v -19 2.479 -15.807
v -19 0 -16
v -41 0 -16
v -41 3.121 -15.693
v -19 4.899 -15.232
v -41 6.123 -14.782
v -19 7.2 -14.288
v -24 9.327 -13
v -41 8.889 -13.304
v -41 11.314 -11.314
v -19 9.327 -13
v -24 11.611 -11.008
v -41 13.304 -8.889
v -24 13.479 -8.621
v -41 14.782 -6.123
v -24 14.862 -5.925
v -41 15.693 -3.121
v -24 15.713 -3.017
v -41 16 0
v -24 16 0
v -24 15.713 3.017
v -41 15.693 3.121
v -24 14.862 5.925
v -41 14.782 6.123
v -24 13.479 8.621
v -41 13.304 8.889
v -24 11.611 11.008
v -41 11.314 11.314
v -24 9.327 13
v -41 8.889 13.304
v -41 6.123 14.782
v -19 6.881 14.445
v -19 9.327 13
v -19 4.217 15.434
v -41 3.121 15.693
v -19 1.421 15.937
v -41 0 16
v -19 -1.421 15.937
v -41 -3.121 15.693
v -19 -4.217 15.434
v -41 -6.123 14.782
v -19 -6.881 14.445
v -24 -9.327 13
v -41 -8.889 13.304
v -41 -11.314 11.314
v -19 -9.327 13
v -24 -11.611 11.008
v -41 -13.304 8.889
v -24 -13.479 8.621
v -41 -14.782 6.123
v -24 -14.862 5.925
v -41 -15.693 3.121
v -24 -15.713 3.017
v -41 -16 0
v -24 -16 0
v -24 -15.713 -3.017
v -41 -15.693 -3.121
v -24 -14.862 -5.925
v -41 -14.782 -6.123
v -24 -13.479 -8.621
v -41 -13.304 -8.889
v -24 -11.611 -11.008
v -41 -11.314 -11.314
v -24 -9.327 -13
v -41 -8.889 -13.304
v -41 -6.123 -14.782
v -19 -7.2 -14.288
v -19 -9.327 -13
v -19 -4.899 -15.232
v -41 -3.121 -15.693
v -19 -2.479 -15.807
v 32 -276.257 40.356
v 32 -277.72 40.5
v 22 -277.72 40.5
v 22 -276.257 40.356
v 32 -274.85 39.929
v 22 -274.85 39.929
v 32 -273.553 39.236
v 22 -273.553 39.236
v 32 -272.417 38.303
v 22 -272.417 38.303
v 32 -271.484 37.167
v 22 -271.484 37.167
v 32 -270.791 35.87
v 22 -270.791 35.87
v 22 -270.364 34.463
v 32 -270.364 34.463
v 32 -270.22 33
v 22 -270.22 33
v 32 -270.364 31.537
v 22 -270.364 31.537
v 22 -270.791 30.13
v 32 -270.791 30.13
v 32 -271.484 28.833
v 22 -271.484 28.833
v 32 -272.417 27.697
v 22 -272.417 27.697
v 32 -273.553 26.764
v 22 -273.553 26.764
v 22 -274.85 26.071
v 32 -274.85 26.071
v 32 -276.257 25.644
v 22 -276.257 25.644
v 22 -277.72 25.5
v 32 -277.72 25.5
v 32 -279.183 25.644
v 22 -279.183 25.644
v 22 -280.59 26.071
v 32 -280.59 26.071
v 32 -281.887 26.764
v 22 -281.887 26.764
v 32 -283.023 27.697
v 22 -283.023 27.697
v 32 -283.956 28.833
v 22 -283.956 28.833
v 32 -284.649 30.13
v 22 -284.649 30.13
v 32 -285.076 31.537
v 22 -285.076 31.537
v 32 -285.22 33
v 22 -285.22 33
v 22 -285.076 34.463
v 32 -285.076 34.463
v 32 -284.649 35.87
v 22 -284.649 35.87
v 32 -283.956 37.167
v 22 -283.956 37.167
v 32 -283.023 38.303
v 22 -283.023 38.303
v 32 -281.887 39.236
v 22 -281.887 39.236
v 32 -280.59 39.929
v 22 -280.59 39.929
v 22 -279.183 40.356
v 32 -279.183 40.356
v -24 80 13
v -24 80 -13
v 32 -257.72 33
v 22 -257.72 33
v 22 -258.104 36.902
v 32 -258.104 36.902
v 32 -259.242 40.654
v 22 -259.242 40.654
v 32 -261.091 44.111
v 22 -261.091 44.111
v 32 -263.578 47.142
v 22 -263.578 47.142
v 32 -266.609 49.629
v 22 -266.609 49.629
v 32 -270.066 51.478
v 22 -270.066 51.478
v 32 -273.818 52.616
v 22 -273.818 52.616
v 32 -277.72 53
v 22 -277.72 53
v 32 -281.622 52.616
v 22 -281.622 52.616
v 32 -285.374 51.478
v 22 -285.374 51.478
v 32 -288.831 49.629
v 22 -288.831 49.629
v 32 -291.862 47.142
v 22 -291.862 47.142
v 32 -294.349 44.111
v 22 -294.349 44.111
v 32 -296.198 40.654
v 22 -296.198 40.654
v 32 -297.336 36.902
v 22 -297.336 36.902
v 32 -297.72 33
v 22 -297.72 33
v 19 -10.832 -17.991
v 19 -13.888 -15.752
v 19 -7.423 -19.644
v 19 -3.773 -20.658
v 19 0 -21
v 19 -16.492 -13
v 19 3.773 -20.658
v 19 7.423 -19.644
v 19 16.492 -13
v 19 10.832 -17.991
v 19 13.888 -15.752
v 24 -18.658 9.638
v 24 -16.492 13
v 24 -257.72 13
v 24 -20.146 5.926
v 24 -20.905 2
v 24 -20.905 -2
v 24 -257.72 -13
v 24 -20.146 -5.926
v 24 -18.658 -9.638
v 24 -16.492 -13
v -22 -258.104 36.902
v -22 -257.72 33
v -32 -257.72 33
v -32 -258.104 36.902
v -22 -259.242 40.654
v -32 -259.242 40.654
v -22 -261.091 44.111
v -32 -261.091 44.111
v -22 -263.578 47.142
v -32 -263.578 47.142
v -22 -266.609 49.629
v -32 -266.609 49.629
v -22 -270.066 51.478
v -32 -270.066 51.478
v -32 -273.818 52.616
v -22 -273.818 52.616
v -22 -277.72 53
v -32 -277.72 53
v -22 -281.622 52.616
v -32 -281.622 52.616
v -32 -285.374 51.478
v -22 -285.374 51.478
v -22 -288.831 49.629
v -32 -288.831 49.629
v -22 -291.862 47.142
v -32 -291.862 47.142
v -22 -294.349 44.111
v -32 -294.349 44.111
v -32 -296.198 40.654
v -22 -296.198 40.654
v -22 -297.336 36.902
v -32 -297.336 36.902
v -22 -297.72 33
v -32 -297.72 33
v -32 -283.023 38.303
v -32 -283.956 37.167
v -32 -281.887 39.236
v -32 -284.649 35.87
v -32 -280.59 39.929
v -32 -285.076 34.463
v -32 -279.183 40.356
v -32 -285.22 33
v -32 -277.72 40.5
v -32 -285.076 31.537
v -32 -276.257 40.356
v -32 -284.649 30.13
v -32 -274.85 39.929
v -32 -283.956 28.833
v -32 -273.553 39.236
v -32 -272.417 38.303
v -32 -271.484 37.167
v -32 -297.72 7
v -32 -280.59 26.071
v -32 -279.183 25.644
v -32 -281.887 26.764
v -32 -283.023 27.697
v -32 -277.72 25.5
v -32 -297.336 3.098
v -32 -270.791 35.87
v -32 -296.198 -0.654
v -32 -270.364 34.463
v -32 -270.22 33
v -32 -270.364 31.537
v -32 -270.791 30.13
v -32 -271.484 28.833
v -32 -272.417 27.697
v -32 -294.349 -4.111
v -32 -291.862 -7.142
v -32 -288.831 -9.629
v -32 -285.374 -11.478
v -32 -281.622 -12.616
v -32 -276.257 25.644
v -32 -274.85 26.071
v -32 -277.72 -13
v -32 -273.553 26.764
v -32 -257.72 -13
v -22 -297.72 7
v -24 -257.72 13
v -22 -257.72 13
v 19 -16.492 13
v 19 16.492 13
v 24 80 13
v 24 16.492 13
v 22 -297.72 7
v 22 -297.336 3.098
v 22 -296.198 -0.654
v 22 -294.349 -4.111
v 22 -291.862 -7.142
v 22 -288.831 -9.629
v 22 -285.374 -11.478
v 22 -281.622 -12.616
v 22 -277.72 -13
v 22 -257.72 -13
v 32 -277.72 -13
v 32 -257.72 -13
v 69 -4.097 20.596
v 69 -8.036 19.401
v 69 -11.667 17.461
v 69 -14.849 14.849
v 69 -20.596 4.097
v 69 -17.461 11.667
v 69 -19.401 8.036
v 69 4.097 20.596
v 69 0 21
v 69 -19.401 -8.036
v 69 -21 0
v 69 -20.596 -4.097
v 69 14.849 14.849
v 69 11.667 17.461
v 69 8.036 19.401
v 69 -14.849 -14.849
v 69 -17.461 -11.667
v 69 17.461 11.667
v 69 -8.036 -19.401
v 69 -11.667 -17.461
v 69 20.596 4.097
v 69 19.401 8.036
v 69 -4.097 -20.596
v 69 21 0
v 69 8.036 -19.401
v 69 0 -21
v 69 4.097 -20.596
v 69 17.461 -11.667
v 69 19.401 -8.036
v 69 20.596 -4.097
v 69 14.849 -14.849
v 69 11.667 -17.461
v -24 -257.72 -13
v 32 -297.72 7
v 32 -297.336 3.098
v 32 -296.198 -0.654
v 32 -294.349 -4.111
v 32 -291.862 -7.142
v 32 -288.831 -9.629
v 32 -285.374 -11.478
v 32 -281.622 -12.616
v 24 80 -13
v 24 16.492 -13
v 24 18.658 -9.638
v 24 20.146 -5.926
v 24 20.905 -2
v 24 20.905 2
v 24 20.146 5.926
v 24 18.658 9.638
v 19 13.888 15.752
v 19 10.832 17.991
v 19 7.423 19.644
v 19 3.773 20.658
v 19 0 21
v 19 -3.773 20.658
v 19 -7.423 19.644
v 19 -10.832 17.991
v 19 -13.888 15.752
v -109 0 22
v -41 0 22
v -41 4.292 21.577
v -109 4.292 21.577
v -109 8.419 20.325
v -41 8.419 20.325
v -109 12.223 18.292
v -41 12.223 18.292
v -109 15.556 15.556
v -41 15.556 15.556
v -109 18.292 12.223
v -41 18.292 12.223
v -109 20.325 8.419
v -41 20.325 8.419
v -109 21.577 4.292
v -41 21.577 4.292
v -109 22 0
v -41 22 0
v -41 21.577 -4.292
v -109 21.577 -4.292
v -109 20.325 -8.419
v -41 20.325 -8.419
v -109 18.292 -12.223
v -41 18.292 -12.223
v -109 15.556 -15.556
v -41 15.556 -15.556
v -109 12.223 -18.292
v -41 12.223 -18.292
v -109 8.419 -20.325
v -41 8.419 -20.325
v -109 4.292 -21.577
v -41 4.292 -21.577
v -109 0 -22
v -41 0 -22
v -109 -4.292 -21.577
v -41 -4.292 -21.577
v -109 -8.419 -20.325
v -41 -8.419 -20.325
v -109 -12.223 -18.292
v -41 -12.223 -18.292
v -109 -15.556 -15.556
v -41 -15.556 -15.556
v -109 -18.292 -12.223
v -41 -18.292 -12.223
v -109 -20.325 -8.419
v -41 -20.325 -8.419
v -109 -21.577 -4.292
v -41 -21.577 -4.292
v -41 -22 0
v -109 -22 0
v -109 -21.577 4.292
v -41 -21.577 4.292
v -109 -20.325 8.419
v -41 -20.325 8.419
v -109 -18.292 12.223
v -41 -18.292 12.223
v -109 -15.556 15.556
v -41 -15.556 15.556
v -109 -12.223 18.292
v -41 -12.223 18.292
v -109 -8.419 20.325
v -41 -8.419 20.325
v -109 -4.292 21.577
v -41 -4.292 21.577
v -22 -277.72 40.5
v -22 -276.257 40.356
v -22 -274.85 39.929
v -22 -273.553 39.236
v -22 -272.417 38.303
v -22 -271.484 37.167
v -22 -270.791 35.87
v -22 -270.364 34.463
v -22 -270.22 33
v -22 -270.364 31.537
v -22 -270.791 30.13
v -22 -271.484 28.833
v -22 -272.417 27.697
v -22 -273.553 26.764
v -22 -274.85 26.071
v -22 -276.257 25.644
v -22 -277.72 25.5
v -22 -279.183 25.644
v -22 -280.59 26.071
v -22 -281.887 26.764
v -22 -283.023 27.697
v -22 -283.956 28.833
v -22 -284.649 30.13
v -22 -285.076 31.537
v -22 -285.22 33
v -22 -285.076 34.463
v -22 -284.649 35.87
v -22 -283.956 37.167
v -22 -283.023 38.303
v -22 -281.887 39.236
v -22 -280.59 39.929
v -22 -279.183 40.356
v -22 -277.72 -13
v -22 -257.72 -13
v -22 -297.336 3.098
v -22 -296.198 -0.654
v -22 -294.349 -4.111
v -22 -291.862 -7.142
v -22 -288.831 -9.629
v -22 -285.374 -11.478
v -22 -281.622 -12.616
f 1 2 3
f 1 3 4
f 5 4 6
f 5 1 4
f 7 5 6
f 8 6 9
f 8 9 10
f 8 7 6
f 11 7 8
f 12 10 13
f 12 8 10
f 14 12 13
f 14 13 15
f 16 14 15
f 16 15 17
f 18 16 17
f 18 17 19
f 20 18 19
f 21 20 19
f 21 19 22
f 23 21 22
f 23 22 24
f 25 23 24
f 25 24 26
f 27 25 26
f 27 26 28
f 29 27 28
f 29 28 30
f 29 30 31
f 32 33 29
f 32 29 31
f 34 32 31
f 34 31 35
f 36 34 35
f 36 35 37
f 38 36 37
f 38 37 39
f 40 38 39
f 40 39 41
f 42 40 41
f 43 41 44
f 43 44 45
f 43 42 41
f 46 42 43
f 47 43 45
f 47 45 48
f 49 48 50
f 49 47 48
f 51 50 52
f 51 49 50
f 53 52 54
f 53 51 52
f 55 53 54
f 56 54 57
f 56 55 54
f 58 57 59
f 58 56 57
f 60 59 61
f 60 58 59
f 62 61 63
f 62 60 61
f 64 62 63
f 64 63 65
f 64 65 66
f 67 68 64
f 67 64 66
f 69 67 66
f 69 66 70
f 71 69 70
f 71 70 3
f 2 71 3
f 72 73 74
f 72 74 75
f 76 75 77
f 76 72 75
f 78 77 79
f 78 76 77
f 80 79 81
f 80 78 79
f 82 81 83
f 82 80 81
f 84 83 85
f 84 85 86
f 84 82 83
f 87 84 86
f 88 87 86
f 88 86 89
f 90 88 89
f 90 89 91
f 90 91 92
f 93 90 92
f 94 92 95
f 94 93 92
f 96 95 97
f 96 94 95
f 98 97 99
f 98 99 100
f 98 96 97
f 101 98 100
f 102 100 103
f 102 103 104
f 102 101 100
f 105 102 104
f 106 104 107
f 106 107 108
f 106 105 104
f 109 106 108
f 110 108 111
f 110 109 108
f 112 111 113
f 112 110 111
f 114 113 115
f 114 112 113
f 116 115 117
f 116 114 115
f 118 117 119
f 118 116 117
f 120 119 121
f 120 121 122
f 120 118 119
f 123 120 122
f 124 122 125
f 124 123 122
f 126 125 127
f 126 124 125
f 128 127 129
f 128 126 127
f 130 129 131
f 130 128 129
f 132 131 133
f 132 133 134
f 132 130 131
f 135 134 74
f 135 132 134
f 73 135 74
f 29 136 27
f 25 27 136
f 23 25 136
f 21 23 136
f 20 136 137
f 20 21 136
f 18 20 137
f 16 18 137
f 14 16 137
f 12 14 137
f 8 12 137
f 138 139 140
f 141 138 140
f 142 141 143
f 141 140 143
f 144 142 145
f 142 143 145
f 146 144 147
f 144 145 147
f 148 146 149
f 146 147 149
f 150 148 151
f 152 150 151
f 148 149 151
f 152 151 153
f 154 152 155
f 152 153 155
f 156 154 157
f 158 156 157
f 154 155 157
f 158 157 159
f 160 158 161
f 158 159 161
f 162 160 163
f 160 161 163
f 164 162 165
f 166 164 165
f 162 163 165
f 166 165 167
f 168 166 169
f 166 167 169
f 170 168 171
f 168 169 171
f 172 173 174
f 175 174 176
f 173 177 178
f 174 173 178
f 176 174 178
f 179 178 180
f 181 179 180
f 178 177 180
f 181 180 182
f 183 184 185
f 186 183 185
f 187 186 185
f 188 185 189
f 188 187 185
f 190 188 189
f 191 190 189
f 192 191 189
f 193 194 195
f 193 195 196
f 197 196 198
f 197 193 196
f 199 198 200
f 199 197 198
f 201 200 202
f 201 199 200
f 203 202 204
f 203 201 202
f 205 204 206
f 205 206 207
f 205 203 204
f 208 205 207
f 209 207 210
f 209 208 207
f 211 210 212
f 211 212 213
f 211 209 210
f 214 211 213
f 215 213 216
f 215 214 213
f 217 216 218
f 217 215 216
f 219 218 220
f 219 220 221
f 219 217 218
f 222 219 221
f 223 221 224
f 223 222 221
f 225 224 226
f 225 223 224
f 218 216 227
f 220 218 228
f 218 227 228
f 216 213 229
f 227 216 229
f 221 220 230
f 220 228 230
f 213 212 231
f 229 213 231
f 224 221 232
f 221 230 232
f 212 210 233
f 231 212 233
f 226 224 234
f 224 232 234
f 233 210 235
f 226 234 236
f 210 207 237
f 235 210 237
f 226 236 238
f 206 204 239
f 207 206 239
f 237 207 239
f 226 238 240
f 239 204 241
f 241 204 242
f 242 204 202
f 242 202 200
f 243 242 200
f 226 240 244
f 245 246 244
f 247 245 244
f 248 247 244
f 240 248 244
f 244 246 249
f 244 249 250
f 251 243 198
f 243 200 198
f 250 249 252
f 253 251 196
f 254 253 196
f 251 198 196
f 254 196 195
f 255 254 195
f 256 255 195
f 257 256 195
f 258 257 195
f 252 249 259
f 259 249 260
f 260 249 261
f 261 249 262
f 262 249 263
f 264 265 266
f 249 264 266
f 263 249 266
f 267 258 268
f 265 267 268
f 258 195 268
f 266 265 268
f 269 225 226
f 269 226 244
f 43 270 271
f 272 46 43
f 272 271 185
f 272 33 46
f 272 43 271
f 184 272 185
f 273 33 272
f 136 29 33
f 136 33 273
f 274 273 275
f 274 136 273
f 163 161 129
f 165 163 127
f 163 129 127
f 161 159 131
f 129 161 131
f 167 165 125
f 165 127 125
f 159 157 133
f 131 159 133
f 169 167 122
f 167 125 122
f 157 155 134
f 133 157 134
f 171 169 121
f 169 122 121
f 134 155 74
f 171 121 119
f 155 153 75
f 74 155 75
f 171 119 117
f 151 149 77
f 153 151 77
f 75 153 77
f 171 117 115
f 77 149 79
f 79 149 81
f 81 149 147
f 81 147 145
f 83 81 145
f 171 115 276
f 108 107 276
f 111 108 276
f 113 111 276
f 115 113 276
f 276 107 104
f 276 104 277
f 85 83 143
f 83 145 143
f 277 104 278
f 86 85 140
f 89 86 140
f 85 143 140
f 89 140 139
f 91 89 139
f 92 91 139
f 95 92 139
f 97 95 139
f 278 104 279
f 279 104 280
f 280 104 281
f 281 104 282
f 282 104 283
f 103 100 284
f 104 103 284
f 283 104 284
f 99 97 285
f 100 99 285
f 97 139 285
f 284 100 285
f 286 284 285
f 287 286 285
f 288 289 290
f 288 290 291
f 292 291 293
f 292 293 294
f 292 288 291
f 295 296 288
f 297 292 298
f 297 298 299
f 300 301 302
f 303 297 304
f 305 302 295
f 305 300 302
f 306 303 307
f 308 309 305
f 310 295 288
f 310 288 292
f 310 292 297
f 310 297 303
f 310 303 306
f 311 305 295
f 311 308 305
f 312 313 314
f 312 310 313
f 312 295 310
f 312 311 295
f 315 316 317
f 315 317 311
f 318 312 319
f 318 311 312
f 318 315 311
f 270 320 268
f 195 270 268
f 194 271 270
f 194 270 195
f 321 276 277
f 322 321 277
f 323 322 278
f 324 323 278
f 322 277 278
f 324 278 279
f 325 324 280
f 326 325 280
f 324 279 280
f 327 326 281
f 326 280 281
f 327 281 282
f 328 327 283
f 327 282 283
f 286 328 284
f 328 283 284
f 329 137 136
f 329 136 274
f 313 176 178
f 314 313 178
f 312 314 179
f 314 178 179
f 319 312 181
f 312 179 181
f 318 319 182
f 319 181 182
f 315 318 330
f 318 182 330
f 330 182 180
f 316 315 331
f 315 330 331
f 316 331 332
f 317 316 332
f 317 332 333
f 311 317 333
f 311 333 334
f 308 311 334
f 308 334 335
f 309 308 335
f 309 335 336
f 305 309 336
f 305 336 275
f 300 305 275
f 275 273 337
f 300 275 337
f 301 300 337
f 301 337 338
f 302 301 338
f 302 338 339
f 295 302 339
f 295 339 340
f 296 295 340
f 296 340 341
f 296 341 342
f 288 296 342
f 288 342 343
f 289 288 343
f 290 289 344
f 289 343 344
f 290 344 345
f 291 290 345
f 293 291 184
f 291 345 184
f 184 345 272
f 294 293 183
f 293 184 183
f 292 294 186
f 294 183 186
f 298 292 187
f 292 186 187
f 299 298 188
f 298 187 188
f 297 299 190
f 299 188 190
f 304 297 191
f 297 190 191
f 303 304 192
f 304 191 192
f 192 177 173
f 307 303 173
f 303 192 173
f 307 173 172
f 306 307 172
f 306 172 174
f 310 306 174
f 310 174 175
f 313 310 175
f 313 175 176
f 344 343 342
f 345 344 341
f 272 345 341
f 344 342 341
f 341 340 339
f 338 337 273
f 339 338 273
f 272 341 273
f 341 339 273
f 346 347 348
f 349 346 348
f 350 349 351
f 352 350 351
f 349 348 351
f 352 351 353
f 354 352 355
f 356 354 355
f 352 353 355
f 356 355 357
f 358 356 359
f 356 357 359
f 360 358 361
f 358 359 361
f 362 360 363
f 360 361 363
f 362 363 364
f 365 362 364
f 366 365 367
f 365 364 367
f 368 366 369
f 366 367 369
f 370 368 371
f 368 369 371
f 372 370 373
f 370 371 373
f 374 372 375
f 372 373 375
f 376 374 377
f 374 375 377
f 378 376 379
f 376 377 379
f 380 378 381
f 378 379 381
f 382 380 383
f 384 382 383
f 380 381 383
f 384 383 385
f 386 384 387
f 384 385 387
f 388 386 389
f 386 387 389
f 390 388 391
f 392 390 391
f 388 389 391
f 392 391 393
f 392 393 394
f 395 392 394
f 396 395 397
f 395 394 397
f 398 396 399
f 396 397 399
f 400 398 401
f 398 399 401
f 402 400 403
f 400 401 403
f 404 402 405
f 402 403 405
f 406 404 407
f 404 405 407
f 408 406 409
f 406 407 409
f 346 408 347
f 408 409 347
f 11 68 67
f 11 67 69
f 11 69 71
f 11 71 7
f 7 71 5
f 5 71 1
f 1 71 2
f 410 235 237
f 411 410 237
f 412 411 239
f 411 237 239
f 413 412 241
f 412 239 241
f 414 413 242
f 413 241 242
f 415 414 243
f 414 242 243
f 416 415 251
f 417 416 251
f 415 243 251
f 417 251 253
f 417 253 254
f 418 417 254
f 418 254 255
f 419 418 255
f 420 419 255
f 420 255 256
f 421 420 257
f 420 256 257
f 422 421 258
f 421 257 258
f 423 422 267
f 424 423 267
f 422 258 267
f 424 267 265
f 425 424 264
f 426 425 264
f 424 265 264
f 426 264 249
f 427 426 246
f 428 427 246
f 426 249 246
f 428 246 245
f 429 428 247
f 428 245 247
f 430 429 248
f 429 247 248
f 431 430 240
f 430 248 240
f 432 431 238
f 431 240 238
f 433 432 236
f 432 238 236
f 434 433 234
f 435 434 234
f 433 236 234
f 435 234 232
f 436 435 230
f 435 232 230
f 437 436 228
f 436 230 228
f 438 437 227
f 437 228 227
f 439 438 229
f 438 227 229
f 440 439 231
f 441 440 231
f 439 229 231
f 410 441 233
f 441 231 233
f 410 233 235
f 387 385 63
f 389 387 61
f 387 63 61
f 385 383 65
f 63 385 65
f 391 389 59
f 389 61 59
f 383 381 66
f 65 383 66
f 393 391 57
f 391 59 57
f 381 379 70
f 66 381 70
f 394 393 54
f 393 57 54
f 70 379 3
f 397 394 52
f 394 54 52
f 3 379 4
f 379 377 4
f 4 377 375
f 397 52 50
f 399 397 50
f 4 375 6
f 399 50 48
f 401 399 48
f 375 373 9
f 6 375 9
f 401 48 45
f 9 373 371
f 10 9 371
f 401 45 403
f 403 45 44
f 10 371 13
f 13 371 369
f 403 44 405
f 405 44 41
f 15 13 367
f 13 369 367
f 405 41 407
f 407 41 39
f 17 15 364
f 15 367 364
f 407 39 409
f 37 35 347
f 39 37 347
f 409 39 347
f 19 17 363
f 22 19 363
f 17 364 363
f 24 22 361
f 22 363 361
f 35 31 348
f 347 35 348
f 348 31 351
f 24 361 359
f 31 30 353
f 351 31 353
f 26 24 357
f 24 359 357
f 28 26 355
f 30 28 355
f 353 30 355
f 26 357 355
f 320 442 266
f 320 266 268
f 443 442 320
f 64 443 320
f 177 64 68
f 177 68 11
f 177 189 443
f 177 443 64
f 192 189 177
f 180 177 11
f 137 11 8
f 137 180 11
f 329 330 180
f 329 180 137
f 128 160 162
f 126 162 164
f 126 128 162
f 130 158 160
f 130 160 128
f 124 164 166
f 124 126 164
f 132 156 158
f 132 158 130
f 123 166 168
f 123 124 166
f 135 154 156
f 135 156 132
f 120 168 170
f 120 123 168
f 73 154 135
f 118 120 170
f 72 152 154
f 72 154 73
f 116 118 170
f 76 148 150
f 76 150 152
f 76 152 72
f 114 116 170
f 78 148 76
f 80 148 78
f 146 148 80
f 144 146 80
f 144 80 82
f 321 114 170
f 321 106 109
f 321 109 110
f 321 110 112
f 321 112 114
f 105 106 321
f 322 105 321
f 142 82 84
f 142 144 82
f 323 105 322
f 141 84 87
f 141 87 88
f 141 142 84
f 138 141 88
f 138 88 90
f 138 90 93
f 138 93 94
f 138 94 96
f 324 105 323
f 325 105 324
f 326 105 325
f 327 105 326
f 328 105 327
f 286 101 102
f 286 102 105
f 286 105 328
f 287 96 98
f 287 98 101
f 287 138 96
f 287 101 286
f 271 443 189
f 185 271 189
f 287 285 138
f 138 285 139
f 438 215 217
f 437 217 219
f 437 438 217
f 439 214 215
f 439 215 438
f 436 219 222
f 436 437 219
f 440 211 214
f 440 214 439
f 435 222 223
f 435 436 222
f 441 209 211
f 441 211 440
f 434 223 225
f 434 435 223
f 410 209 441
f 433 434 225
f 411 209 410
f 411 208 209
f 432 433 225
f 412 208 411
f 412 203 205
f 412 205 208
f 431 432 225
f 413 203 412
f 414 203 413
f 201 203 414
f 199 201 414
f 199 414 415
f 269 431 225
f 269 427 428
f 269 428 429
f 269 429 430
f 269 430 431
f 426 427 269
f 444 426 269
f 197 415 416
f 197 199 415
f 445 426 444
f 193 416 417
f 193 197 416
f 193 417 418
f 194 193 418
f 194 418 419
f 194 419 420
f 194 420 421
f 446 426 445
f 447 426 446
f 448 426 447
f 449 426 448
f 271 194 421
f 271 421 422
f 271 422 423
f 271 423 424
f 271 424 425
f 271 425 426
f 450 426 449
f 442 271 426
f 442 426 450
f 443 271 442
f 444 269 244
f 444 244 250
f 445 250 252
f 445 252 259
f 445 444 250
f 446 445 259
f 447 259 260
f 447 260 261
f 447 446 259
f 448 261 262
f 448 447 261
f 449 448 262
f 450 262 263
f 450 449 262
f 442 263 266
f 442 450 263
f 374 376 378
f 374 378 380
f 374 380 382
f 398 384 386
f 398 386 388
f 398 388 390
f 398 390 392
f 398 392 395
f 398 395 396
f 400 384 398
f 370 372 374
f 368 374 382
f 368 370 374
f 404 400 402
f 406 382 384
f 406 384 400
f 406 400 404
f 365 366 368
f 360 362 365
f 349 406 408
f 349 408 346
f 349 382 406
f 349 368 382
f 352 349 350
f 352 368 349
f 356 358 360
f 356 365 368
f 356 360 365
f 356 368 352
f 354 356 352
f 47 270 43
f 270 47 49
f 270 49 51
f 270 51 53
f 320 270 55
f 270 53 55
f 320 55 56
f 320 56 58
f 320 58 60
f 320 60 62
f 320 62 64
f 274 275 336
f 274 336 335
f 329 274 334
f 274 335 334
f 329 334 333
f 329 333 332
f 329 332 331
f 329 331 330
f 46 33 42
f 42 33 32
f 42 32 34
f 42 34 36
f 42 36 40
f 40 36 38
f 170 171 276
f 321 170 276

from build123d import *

# Parameters (mm, degrees)
SKETCH3_R                = 16
BOSS_EXTRUDE1_DEPTH      = 22
SKETCH4_R                = 22
BOSS_EXTRUDE2_DEPTH      = 68
SKETCH2_R                = 21
BOSS_EXTRUDE3_DEPTH      = 50
SKETCH1_W                = 48
SKETCH1_H                = 26
BOSS_EXTRUDE5_DEPTH      = 80
BOSS_EXTRUDE5_DEPTH_BACK = 257.72
BOSS_EXTRUDE7_START      = -2
BOSS_EXTRUDE7_DEPTH      = 10
CUT_EXTRUDE4_START       = -10
SKETCH10_R               = 7.5
CUT_EXTRUDE4_DEPTH       = 10


with BuildPart() as part:
    # Sketch3 → Boss-Extrude1 (new body)
    with BuildSketch(Plane(origin=(-19, 0, 0), x_dir=(0, 0, -1), z_dir=(1, 0, 0))):
        Circle(SKETCH3_R)
    extrude(amount=-BOSS_EXTRUDE1_DEPTH)

    # Sketch4 → Boss-Extrude2 (add)
    with BuildSketch(Plane.ZY.offset(41)):
        Circle(SKETCH4_R)
    extrude(amount=BOSS_EXTRUDE2_DEPTH)



with BuildPart() as body_2:
    # Sketch2 → Boss-Extrude3 (new body)
    with BuildSketch(Plane(origin=(19, 0, 0), x_dir=(0, 0, -1), z_dir=(1, 0, 0))):
        Circle(SKETCH2_R)
    extrude(amount=BOSS_EXTRUDE3_DEPTH)


with BuildPart() as part_1:
    add(part.part)

    add(body_2.part)  # Boss-Extrude5 merges body 2
    # Sketch1 → Boss-Extrude5 (add, two sides)
    with BuildSketch(Plane(origin=(0, 0, 0), x_dir=(1, 0, 0), z_dir=(0, 1, 0))) as boss_extrude5_sk:
        Rectangle(SKETCH1_W, SKETCH1_H)
    extrude(amount=BOSS_EXTRUDE5_DEPTH)
    extrude(boss_extrude5_sk.sketch, amount=-BOSS_EXTRUDE5_DEPTH_BACK)


with BuildPart() as body_2_2:
    # Sketch5 → Boss-Extrude7 (new body)
    with BuildSketch(Plane(origin=(24, 0, 0), x_dir=(0, 0, -1), z_dir=(1, 0, 0)).offset(BOSS_EXTRUDE7_START)):
        with BuildLine():
            Line((13, -257.72), (-33, -257.72))
            ThreePointArc((-33, -257.72), (-53, -277.72), (-33, -297.72))
            Line((-33, -297.72), (-7, -297.72))
            ThreePointArc((-7, -297.72), (7.142135624, -291.862135624), (13, -277.72))
            Line((13, -277.72), (13, -257.72))
        make_face()
    boss_extrude7 = extrude(amount=BOSS_EXTRUDE7_DEPTH)

    # Sketch10 → Cut-Extrude4 (cut)
    with BuildSketch(Plane.ZY.offset(-22).offset(CUT_EXTRUDE4_START)):
        with Locations((33, -277.72)):
            Circle(SKETCH10_R)
    cut_extrude4 = extrude(amount=CUT_EXTRUDE4_DEPTH, mode=Mode.SUBTRACT)


with BuildPart() as part_2:
    add(part_1.part)

    # Mirror26: Boss-Extrude7, Cut-Extrude4 across plane
    add(boss_extrude7.mirror(Plane(origin=(0, 0, 0), x_dir=(0, 0, 1), z_dir=(1, 0, 0))))
    add(cut_extrude4.mirror(Plane(origin=(0, 0, 0), x_dir=(0, 0, 1), z_dir=(1, 0, 0))), mode=Mode.SUBTRACT)


solid = Compound([body_2_2.part, part_2.part])
